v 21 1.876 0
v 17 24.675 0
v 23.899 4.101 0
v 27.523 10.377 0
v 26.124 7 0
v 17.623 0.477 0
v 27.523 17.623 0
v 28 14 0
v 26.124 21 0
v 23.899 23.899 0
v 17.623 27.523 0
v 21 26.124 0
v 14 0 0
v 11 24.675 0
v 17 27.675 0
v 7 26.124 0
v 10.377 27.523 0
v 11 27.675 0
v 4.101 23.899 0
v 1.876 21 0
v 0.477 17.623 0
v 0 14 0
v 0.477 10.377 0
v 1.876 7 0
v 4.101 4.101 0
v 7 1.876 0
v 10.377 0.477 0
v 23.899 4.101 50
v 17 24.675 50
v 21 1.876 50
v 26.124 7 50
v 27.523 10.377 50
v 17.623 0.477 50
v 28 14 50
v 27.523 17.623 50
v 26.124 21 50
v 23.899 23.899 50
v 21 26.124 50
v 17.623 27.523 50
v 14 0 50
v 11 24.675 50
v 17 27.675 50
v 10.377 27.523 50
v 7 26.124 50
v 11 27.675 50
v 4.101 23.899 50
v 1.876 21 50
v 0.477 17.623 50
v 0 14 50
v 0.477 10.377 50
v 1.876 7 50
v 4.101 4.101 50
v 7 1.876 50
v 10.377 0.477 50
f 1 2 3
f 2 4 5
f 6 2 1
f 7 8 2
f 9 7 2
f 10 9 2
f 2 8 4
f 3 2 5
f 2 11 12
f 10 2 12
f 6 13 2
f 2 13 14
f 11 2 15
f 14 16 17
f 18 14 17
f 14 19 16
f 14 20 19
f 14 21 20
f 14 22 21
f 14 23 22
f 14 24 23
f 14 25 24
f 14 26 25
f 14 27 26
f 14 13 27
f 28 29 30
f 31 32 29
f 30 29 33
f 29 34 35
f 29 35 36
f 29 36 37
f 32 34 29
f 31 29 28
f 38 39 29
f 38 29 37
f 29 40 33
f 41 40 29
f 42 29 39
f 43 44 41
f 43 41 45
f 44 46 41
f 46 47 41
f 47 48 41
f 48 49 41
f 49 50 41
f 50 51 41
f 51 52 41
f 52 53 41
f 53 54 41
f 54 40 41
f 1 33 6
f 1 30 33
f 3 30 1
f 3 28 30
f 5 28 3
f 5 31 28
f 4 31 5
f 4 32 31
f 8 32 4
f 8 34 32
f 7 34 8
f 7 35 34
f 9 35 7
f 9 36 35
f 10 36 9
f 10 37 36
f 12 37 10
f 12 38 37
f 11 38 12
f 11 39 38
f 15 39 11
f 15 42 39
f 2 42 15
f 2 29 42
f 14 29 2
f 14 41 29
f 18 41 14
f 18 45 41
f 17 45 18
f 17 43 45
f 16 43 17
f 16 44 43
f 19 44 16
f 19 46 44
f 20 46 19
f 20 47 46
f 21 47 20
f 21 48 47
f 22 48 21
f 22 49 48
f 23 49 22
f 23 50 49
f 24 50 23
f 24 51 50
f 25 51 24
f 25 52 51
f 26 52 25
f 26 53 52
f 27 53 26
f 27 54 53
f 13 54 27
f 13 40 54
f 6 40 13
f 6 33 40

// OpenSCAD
$fn = 32;

// ----------------------------------------------------------------------
// Keyway shaft: d28 shaft, key 6 x 3 mm
// ----------------------------------------------------------------------

// --- parameters (mm) ---
shaft_r = 14;             // shaft radius
key_w = 6;                // keyway width
key_d = 3;                // keyway depth below the surface line
plate_t = 50;             // shaft length, Z (extrusion height)
fit_tol = 0.1;            // declared fit tolerance (prompt contract)
free_tol = 0.5;           // declared free tolerance (prompt contract)

shaft_d = 2 * shaft_r;  // shaft diameter
circle_step = 15;  // polygon sampling step, degrees

profile = [[10.377, 27.523], [7, 26.124], [4.101, 23.899], [1.876, 21], [0.477, 17.623], [0, 14], [0.477, 10.377], [1.876, 7], [4.101, 4.101], [7, 1.876], [10.377, 0.477], [14, 0], [17.623, 0.477], [21, 1.876], [23.899, 4.101], [26.124, 7], [27.523, 10.377], [28, 14], [27.523, 17.623], [26.124, 21], [23.899, 23.899], [21, 26.124], [17.623, 27.523], [17, 27.675], [17, 24.675], [11, 24.675], [11, 27.675]];  // primary outline, 27 points, counter clockwise

// --- the one profile operation ---
linear_extrude(height = plate_t) polygon(points = profile);
